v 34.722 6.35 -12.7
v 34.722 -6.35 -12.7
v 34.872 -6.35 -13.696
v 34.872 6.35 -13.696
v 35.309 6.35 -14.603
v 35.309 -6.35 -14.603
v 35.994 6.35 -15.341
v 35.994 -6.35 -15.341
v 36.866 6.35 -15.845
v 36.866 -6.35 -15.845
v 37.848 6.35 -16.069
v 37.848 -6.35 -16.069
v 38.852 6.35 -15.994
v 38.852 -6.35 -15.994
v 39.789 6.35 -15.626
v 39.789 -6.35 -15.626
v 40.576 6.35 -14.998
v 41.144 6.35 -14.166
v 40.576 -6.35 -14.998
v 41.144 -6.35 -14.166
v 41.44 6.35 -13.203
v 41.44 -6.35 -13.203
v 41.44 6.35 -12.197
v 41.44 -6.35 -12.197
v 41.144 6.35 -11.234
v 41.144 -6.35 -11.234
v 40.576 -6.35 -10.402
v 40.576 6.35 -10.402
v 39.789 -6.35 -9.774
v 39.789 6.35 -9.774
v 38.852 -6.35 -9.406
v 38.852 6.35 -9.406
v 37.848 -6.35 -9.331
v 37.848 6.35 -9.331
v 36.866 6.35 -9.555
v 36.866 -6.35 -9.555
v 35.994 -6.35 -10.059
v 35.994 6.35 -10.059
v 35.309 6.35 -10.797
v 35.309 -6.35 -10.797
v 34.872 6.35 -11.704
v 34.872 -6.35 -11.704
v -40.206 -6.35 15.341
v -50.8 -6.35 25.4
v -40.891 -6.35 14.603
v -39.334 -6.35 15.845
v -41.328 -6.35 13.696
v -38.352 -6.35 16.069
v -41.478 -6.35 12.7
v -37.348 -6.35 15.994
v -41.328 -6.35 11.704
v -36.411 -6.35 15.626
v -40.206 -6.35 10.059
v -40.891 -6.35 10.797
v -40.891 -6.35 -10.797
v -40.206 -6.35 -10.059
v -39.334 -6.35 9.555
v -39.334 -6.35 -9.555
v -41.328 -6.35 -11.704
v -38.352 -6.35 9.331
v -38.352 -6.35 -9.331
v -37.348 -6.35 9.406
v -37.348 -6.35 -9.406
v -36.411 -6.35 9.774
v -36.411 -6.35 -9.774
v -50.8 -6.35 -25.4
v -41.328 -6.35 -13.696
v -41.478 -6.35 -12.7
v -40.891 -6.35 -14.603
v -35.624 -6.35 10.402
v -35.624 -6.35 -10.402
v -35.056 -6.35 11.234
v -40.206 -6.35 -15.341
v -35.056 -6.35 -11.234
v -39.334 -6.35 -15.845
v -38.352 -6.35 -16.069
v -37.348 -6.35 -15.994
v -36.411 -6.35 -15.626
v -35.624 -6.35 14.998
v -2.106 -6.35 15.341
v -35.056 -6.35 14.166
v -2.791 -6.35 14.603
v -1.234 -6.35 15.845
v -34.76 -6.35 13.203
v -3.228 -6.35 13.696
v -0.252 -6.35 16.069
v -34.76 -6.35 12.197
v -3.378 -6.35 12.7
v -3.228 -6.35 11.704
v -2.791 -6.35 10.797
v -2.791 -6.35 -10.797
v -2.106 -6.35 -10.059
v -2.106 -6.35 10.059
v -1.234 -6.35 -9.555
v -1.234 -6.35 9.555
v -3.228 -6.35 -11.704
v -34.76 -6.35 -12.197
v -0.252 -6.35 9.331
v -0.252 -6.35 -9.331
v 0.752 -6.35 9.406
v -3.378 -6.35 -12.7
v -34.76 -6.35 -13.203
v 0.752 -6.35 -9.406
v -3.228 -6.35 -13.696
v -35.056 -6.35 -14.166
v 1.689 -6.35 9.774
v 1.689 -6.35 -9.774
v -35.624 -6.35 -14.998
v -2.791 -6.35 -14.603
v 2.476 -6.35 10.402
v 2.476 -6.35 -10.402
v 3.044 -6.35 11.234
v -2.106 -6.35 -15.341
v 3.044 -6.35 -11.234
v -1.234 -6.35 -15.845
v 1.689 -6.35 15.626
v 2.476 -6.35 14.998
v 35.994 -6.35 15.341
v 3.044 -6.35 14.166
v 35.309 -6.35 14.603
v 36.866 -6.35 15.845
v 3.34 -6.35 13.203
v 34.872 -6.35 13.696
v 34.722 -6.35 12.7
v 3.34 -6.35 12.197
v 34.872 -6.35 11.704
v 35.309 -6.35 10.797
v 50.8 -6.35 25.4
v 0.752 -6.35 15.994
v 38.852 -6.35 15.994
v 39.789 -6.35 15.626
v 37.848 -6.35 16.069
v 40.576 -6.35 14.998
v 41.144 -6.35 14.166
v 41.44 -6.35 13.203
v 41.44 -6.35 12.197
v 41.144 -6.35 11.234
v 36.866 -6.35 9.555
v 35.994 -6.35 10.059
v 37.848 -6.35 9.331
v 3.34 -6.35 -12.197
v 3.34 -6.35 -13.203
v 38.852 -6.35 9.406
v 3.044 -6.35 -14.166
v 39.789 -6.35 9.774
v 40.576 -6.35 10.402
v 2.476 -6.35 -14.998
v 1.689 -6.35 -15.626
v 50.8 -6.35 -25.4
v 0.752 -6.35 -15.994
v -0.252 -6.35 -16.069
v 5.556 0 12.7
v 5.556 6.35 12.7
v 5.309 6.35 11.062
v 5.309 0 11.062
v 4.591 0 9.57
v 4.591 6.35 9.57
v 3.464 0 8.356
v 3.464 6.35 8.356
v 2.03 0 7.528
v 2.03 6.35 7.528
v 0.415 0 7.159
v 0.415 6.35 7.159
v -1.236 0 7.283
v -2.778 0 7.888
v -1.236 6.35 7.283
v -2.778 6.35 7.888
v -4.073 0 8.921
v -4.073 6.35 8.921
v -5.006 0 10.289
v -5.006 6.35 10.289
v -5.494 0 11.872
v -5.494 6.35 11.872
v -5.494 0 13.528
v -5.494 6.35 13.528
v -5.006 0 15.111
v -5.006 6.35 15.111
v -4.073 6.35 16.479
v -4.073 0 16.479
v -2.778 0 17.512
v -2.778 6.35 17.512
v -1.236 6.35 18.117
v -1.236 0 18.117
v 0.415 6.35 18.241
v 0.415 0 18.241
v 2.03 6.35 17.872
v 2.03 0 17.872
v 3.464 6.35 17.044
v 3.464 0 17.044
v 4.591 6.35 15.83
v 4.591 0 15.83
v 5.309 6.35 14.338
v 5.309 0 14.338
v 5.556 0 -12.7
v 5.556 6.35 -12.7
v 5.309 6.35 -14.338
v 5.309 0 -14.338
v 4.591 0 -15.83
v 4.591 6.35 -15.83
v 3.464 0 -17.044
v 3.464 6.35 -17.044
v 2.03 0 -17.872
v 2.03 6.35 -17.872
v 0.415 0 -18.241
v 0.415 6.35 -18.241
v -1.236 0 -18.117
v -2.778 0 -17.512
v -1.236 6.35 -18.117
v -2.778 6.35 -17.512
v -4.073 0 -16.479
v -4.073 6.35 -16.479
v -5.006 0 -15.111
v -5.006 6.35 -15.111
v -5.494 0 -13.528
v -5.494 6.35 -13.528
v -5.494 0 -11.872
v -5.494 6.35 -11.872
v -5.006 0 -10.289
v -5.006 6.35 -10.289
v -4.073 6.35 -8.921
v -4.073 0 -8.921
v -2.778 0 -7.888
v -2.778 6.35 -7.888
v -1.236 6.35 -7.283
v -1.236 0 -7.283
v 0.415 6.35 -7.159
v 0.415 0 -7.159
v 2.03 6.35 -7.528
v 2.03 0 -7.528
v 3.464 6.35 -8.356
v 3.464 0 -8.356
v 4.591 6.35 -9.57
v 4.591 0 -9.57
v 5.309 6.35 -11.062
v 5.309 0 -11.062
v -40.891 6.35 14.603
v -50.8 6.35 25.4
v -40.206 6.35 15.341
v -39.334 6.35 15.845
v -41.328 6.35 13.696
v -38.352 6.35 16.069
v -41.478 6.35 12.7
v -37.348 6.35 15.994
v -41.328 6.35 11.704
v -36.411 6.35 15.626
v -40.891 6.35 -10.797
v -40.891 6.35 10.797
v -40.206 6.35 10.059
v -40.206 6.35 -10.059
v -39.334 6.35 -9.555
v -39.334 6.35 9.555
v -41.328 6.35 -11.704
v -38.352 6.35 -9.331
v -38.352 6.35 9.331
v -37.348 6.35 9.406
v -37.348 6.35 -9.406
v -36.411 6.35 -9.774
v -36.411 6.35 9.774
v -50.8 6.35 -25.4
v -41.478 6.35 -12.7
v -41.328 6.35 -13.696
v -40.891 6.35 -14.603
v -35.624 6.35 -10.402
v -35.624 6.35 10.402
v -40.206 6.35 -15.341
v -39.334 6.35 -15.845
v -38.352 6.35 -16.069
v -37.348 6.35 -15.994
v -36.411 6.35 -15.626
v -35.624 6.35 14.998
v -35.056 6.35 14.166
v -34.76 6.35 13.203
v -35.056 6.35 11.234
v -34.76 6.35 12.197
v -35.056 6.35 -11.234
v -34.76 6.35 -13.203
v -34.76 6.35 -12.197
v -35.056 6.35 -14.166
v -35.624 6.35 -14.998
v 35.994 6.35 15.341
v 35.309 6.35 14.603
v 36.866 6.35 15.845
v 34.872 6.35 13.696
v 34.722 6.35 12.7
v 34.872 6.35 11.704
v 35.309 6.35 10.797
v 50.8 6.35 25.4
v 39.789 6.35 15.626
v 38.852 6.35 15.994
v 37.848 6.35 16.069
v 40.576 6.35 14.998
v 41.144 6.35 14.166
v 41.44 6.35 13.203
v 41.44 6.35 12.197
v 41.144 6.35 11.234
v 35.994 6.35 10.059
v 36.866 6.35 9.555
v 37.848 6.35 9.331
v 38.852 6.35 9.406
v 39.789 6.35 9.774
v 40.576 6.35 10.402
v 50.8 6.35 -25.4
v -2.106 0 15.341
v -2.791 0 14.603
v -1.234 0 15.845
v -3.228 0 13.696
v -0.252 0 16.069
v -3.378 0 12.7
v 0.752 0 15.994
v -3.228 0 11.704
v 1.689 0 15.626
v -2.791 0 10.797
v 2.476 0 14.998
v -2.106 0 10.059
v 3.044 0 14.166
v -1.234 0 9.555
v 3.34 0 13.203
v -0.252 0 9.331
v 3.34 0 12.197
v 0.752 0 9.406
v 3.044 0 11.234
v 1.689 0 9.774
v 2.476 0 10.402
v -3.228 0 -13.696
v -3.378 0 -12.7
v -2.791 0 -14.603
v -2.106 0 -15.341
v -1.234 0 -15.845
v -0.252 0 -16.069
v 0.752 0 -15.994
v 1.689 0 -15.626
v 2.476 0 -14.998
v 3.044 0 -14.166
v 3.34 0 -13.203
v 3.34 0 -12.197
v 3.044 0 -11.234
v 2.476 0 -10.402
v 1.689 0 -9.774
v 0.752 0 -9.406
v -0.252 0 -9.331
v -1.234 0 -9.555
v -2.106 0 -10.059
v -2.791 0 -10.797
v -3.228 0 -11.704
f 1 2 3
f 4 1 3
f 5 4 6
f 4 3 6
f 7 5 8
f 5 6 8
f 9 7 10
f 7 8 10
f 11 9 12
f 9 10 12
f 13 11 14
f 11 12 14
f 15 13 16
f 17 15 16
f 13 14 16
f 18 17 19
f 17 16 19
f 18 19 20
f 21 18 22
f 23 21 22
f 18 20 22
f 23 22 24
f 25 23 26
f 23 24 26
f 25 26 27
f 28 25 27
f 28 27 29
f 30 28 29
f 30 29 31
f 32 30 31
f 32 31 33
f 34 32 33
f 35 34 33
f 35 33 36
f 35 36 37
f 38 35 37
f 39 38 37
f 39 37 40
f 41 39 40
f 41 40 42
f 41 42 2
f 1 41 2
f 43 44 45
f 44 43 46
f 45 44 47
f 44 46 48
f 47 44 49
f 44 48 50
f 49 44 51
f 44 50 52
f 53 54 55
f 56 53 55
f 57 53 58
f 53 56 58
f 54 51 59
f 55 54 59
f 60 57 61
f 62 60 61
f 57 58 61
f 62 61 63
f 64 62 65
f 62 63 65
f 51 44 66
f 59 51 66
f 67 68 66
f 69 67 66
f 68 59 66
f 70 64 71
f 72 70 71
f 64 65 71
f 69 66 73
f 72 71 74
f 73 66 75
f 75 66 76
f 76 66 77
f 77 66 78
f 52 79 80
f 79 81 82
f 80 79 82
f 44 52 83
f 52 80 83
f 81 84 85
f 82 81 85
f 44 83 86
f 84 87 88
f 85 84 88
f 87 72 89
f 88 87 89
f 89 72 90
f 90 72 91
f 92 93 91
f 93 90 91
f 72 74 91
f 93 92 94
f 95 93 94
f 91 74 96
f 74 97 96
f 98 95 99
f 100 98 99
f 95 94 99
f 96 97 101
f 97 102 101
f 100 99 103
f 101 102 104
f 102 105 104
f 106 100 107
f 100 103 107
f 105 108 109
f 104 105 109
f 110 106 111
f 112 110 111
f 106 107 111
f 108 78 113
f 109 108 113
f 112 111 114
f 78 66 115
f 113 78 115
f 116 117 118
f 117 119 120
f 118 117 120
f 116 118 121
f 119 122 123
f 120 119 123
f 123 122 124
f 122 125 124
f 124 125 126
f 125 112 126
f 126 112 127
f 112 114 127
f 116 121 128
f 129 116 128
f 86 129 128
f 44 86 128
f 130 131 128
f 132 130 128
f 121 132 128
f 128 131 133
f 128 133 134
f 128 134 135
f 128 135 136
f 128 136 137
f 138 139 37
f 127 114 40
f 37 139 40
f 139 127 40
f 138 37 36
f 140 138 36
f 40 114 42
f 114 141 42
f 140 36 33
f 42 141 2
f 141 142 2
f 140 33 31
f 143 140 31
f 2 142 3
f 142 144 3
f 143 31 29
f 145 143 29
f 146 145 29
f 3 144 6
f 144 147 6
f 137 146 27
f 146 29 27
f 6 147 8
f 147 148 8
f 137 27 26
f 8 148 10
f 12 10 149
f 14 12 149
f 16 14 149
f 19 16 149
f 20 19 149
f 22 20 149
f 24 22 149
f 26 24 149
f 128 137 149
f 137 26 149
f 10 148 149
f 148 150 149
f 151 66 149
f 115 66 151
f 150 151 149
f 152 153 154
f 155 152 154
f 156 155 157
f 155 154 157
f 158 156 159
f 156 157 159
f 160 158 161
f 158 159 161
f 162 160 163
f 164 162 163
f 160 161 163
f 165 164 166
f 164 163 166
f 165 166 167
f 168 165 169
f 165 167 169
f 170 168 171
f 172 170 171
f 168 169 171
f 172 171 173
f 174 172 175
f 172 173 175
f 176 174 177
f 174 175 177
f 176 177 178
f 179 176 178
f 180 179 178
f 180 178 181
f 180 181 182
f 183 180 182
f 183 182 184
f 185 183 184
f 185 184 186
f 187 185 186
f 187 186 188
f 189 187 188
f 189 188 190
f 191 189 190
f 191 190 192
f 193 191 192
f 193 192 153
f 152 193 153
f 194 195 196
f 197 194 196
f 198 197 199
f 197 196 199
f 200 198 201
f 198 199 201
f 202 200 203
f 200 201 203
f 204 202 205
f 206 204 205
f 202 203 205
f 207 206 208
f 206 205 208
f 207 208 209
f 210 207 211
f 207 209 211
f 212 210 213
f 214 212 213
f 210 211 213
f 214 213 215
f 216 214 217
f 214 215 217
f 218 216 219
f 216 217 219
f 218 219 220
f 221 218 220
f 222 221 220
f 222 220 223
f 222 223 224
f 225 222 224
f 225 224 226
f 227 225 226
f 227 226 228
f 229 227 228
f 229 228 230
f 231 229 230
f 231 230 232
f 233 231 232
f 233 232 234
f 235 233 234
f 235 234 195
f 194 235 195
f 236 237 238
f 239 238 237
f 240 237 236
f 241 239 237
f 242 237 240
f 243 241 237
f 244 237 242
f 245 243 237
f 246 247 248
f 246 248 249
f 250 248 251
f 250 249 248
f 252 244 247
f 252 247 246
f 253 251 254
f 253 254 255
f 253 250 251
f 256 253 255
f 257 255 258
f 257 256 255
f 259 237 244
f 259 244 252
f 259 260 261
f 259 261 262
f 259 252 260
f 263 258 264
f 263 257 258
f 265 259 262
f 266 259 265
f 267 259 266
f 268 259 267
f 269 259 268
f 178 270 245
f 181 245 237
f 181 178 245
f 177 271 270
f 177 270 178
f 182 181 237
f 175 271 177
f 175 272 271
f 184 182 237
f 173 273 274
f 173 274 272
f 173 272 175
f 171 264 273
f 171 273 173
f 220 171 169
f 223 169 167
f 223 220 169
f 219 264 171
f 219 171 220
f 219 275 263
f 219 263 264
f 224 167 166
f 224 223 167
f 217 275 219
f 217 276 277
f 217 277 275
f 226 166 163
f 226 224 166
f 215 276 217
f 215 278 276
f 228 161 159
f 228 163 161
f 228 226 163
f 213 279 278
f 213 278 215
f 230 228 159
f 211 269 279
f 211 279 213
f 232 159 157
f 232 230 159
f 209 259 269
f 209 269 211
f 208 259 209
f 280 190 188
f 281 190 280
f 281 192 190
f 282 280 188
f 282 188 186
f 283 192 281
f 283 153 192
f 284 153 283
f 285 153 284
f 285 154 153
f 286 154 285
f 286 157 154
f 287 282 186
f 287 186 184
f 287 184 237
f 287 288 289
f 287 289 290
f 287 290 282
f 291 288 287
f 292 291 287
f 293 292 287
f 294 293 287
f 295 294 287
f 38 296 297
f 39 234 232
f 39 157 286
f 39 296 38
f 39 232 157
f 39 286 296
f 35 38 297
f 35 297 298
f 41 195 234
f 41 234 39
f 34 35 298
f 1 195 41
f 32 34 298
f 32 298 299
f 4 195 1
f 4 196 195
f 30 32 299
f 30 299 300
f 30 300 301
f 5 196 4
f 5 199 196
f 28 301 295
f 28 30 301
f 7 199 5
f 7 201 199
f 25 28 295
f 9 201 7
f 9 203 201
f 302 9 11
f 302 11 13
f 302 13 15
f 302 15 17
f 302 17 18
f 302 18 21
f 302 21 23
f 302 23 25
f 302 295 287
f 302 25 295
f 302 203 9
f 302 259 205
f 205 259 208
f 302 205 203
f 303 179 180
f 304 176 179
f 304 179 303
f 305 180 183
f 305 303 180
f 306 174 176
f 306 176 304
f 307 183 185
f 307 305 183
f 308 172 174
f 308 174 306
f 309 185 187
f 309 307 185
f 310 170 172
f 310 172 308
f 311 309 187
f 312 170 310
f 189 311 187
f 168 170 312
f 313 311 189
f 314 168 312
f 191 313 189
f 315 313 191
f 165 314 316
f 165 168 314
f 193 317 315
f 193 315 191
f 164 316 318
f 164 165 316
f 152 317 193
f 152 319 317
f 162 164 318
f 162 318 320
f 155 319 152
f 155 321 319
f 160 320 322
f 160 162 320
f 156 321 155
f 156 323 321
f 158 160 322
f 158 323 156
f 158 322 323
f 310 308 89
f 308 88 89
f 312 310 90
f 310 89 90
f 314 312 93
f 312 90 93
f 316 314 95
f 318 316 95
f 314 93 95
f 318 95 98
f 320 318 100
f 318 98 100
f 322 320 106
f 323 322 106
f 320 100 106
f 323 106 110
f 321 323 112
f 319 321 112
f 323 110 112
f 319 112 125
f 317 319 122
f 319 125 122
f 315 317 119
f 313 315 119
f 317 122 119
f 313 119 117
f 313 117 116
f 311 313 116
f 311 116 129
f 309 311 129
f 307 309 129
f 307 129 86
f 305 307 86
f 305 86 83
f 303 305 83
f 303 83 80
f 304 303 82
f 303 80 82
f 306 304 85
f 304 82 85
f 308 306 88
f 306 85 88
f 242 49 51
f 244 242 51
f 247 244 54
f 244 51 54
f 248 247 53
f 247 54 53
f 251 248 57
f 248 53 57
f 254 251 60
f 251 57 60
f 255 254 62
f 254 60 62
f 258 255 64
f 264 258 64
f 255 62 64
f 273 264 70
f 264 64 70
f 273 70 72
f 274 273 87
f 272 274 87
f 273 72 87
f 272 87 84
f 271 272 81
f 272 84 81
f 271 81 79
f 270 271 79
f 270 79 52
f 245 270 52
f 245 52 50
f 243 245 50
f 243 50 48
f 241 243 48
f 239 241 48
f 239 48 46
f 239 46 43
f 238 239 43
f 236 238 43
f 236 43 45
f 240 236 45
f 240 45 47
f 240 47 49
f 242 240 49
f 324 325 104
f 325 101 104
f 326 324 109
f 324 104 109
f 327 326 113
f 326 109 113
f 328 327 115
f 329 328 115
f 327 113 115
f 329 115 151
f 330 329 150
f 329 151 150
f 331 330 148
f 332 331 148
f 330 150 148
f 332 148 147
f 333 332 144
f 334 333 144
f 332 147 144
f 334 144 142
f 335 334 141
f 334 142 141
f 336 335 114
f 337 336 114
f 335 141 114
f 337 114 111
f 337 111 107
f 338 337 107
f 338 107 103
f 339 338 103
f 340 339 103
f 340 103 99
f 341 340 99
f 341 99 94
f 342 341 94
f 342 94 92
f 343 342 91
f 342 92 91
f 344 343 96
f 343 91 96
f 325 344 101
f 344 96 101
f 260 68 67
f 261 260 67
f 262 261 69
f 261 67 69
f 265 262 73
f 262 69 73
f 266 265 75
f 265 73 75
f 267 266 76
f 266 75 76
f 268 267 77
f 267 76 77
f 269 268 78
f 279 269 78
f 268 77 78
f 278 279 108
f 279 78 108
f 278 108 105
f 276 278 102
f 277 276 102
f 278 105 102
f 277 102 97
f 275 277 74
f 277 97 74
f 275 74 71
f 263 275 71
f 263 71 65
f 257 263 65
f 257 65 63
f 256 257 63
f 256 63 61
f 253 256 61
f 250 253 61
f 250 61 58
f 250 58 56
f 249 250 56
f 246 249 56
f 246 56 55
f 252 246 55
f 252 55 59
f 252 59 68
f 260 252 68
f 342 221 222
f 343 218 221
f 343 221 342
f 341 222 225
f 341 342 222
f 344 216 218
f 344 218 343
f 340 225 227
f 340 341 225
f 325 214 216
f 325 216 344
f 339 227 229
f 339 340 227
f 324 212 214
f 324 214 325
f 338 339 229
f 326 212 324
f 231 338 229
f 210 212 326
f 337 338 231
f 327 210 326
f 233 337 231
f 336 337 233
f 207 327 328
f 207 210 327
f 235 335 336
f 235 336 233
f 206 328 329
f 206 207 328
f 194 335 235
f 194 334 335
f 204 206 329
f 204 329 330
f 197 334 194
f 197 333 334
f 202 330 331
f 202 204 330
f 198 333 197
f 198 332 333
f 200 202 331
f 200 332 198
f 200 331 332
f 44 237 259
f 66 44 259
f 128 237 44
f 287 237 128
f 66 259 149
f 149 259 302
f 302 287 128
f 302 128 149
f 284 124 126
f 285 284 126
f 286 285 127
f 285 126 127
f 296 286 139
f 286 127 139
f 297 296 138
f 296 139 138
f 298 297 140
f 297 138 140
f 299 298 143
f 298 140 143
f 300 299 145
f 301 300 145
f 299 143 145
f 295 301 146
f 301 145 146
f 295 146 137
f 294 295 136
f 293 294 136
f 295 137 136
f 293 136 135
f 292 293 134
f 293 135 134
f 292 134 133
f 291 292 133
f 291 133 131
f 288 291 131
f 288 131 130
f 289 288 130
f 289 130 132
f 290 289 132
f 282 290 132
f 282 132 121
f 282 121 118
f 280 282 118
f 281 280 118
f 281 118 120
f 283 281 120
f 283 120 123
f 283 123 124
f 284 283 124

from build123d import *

# Parameters (mm, degrees)
SKETCH1_W                                        = 101.6
SKETCH1_H                                        = 50.8
BOSS_EXTRUDE1_DEPTH                              = 6.35
F_1_4_CLEARANCE_HOLE1_D                          = 6.7564
CBORE_FOR_1_4_SOCKET_HEAD_CAP_SCREW1_D           = 6.7564
CBORE_FOR_1_4_SOCKET_HEAD_CAP_SCREW1_CBORE_D     = 11.1125
CBORE_FOR_1_4_SOCKET_HEAD_CAP_SCREW1_CBORE_DEPTH = 6.35


with BuildPart() as part:
    # Sketch1 → Boss-Extrude1 (new, symmetric)
    with BuildSketch(Plane(origin=(0, 0, 0), x_dir=(1, 0, 0), z_dir=(0, 1, 0))):
        Rectangle(SKETCH1_W, SKETCH1_H)
    extrude(amount=BOSS_EXTRUDE1_DEPTH, both=True)

    # 1/4 Clearance Hole1 (through all)
    with Locations(Plane(origin=(0, 6.35, 0), x_dir=(1, 0, 0), z_dir=(0, 1, 0))):
        with Locations((-38.1, 12.7), (-38.1, -12.7), (38.1, 12.7), (38.1, -12.7)):
            Hole(F_1_4_CLEARANCE_HOLE1_D / 2)

    # CBORE for 1/4 Socket Head Cap Screw1 (through all)
    with Locations(Plane(origin=(0, 6.35, 0), x_dir=(1, 0, 0), z_dir=(0, 1, 0))):
        with Locations((0, 12.7), (0, -12.7)):
            CounterBoreHole(CBORE_FOR_1_4_SOCKET_HEAD_CAP_SCREW1_D / 2, CBORE_FOR_1_4_SOCKET_HEAD_CAP_SCREW1_CBORE_D / 2, CBORE_FOR_1_4_SOCKET_HEAD_CAP_SCREW1_CBORE_DEPTH)


solid = part.part
